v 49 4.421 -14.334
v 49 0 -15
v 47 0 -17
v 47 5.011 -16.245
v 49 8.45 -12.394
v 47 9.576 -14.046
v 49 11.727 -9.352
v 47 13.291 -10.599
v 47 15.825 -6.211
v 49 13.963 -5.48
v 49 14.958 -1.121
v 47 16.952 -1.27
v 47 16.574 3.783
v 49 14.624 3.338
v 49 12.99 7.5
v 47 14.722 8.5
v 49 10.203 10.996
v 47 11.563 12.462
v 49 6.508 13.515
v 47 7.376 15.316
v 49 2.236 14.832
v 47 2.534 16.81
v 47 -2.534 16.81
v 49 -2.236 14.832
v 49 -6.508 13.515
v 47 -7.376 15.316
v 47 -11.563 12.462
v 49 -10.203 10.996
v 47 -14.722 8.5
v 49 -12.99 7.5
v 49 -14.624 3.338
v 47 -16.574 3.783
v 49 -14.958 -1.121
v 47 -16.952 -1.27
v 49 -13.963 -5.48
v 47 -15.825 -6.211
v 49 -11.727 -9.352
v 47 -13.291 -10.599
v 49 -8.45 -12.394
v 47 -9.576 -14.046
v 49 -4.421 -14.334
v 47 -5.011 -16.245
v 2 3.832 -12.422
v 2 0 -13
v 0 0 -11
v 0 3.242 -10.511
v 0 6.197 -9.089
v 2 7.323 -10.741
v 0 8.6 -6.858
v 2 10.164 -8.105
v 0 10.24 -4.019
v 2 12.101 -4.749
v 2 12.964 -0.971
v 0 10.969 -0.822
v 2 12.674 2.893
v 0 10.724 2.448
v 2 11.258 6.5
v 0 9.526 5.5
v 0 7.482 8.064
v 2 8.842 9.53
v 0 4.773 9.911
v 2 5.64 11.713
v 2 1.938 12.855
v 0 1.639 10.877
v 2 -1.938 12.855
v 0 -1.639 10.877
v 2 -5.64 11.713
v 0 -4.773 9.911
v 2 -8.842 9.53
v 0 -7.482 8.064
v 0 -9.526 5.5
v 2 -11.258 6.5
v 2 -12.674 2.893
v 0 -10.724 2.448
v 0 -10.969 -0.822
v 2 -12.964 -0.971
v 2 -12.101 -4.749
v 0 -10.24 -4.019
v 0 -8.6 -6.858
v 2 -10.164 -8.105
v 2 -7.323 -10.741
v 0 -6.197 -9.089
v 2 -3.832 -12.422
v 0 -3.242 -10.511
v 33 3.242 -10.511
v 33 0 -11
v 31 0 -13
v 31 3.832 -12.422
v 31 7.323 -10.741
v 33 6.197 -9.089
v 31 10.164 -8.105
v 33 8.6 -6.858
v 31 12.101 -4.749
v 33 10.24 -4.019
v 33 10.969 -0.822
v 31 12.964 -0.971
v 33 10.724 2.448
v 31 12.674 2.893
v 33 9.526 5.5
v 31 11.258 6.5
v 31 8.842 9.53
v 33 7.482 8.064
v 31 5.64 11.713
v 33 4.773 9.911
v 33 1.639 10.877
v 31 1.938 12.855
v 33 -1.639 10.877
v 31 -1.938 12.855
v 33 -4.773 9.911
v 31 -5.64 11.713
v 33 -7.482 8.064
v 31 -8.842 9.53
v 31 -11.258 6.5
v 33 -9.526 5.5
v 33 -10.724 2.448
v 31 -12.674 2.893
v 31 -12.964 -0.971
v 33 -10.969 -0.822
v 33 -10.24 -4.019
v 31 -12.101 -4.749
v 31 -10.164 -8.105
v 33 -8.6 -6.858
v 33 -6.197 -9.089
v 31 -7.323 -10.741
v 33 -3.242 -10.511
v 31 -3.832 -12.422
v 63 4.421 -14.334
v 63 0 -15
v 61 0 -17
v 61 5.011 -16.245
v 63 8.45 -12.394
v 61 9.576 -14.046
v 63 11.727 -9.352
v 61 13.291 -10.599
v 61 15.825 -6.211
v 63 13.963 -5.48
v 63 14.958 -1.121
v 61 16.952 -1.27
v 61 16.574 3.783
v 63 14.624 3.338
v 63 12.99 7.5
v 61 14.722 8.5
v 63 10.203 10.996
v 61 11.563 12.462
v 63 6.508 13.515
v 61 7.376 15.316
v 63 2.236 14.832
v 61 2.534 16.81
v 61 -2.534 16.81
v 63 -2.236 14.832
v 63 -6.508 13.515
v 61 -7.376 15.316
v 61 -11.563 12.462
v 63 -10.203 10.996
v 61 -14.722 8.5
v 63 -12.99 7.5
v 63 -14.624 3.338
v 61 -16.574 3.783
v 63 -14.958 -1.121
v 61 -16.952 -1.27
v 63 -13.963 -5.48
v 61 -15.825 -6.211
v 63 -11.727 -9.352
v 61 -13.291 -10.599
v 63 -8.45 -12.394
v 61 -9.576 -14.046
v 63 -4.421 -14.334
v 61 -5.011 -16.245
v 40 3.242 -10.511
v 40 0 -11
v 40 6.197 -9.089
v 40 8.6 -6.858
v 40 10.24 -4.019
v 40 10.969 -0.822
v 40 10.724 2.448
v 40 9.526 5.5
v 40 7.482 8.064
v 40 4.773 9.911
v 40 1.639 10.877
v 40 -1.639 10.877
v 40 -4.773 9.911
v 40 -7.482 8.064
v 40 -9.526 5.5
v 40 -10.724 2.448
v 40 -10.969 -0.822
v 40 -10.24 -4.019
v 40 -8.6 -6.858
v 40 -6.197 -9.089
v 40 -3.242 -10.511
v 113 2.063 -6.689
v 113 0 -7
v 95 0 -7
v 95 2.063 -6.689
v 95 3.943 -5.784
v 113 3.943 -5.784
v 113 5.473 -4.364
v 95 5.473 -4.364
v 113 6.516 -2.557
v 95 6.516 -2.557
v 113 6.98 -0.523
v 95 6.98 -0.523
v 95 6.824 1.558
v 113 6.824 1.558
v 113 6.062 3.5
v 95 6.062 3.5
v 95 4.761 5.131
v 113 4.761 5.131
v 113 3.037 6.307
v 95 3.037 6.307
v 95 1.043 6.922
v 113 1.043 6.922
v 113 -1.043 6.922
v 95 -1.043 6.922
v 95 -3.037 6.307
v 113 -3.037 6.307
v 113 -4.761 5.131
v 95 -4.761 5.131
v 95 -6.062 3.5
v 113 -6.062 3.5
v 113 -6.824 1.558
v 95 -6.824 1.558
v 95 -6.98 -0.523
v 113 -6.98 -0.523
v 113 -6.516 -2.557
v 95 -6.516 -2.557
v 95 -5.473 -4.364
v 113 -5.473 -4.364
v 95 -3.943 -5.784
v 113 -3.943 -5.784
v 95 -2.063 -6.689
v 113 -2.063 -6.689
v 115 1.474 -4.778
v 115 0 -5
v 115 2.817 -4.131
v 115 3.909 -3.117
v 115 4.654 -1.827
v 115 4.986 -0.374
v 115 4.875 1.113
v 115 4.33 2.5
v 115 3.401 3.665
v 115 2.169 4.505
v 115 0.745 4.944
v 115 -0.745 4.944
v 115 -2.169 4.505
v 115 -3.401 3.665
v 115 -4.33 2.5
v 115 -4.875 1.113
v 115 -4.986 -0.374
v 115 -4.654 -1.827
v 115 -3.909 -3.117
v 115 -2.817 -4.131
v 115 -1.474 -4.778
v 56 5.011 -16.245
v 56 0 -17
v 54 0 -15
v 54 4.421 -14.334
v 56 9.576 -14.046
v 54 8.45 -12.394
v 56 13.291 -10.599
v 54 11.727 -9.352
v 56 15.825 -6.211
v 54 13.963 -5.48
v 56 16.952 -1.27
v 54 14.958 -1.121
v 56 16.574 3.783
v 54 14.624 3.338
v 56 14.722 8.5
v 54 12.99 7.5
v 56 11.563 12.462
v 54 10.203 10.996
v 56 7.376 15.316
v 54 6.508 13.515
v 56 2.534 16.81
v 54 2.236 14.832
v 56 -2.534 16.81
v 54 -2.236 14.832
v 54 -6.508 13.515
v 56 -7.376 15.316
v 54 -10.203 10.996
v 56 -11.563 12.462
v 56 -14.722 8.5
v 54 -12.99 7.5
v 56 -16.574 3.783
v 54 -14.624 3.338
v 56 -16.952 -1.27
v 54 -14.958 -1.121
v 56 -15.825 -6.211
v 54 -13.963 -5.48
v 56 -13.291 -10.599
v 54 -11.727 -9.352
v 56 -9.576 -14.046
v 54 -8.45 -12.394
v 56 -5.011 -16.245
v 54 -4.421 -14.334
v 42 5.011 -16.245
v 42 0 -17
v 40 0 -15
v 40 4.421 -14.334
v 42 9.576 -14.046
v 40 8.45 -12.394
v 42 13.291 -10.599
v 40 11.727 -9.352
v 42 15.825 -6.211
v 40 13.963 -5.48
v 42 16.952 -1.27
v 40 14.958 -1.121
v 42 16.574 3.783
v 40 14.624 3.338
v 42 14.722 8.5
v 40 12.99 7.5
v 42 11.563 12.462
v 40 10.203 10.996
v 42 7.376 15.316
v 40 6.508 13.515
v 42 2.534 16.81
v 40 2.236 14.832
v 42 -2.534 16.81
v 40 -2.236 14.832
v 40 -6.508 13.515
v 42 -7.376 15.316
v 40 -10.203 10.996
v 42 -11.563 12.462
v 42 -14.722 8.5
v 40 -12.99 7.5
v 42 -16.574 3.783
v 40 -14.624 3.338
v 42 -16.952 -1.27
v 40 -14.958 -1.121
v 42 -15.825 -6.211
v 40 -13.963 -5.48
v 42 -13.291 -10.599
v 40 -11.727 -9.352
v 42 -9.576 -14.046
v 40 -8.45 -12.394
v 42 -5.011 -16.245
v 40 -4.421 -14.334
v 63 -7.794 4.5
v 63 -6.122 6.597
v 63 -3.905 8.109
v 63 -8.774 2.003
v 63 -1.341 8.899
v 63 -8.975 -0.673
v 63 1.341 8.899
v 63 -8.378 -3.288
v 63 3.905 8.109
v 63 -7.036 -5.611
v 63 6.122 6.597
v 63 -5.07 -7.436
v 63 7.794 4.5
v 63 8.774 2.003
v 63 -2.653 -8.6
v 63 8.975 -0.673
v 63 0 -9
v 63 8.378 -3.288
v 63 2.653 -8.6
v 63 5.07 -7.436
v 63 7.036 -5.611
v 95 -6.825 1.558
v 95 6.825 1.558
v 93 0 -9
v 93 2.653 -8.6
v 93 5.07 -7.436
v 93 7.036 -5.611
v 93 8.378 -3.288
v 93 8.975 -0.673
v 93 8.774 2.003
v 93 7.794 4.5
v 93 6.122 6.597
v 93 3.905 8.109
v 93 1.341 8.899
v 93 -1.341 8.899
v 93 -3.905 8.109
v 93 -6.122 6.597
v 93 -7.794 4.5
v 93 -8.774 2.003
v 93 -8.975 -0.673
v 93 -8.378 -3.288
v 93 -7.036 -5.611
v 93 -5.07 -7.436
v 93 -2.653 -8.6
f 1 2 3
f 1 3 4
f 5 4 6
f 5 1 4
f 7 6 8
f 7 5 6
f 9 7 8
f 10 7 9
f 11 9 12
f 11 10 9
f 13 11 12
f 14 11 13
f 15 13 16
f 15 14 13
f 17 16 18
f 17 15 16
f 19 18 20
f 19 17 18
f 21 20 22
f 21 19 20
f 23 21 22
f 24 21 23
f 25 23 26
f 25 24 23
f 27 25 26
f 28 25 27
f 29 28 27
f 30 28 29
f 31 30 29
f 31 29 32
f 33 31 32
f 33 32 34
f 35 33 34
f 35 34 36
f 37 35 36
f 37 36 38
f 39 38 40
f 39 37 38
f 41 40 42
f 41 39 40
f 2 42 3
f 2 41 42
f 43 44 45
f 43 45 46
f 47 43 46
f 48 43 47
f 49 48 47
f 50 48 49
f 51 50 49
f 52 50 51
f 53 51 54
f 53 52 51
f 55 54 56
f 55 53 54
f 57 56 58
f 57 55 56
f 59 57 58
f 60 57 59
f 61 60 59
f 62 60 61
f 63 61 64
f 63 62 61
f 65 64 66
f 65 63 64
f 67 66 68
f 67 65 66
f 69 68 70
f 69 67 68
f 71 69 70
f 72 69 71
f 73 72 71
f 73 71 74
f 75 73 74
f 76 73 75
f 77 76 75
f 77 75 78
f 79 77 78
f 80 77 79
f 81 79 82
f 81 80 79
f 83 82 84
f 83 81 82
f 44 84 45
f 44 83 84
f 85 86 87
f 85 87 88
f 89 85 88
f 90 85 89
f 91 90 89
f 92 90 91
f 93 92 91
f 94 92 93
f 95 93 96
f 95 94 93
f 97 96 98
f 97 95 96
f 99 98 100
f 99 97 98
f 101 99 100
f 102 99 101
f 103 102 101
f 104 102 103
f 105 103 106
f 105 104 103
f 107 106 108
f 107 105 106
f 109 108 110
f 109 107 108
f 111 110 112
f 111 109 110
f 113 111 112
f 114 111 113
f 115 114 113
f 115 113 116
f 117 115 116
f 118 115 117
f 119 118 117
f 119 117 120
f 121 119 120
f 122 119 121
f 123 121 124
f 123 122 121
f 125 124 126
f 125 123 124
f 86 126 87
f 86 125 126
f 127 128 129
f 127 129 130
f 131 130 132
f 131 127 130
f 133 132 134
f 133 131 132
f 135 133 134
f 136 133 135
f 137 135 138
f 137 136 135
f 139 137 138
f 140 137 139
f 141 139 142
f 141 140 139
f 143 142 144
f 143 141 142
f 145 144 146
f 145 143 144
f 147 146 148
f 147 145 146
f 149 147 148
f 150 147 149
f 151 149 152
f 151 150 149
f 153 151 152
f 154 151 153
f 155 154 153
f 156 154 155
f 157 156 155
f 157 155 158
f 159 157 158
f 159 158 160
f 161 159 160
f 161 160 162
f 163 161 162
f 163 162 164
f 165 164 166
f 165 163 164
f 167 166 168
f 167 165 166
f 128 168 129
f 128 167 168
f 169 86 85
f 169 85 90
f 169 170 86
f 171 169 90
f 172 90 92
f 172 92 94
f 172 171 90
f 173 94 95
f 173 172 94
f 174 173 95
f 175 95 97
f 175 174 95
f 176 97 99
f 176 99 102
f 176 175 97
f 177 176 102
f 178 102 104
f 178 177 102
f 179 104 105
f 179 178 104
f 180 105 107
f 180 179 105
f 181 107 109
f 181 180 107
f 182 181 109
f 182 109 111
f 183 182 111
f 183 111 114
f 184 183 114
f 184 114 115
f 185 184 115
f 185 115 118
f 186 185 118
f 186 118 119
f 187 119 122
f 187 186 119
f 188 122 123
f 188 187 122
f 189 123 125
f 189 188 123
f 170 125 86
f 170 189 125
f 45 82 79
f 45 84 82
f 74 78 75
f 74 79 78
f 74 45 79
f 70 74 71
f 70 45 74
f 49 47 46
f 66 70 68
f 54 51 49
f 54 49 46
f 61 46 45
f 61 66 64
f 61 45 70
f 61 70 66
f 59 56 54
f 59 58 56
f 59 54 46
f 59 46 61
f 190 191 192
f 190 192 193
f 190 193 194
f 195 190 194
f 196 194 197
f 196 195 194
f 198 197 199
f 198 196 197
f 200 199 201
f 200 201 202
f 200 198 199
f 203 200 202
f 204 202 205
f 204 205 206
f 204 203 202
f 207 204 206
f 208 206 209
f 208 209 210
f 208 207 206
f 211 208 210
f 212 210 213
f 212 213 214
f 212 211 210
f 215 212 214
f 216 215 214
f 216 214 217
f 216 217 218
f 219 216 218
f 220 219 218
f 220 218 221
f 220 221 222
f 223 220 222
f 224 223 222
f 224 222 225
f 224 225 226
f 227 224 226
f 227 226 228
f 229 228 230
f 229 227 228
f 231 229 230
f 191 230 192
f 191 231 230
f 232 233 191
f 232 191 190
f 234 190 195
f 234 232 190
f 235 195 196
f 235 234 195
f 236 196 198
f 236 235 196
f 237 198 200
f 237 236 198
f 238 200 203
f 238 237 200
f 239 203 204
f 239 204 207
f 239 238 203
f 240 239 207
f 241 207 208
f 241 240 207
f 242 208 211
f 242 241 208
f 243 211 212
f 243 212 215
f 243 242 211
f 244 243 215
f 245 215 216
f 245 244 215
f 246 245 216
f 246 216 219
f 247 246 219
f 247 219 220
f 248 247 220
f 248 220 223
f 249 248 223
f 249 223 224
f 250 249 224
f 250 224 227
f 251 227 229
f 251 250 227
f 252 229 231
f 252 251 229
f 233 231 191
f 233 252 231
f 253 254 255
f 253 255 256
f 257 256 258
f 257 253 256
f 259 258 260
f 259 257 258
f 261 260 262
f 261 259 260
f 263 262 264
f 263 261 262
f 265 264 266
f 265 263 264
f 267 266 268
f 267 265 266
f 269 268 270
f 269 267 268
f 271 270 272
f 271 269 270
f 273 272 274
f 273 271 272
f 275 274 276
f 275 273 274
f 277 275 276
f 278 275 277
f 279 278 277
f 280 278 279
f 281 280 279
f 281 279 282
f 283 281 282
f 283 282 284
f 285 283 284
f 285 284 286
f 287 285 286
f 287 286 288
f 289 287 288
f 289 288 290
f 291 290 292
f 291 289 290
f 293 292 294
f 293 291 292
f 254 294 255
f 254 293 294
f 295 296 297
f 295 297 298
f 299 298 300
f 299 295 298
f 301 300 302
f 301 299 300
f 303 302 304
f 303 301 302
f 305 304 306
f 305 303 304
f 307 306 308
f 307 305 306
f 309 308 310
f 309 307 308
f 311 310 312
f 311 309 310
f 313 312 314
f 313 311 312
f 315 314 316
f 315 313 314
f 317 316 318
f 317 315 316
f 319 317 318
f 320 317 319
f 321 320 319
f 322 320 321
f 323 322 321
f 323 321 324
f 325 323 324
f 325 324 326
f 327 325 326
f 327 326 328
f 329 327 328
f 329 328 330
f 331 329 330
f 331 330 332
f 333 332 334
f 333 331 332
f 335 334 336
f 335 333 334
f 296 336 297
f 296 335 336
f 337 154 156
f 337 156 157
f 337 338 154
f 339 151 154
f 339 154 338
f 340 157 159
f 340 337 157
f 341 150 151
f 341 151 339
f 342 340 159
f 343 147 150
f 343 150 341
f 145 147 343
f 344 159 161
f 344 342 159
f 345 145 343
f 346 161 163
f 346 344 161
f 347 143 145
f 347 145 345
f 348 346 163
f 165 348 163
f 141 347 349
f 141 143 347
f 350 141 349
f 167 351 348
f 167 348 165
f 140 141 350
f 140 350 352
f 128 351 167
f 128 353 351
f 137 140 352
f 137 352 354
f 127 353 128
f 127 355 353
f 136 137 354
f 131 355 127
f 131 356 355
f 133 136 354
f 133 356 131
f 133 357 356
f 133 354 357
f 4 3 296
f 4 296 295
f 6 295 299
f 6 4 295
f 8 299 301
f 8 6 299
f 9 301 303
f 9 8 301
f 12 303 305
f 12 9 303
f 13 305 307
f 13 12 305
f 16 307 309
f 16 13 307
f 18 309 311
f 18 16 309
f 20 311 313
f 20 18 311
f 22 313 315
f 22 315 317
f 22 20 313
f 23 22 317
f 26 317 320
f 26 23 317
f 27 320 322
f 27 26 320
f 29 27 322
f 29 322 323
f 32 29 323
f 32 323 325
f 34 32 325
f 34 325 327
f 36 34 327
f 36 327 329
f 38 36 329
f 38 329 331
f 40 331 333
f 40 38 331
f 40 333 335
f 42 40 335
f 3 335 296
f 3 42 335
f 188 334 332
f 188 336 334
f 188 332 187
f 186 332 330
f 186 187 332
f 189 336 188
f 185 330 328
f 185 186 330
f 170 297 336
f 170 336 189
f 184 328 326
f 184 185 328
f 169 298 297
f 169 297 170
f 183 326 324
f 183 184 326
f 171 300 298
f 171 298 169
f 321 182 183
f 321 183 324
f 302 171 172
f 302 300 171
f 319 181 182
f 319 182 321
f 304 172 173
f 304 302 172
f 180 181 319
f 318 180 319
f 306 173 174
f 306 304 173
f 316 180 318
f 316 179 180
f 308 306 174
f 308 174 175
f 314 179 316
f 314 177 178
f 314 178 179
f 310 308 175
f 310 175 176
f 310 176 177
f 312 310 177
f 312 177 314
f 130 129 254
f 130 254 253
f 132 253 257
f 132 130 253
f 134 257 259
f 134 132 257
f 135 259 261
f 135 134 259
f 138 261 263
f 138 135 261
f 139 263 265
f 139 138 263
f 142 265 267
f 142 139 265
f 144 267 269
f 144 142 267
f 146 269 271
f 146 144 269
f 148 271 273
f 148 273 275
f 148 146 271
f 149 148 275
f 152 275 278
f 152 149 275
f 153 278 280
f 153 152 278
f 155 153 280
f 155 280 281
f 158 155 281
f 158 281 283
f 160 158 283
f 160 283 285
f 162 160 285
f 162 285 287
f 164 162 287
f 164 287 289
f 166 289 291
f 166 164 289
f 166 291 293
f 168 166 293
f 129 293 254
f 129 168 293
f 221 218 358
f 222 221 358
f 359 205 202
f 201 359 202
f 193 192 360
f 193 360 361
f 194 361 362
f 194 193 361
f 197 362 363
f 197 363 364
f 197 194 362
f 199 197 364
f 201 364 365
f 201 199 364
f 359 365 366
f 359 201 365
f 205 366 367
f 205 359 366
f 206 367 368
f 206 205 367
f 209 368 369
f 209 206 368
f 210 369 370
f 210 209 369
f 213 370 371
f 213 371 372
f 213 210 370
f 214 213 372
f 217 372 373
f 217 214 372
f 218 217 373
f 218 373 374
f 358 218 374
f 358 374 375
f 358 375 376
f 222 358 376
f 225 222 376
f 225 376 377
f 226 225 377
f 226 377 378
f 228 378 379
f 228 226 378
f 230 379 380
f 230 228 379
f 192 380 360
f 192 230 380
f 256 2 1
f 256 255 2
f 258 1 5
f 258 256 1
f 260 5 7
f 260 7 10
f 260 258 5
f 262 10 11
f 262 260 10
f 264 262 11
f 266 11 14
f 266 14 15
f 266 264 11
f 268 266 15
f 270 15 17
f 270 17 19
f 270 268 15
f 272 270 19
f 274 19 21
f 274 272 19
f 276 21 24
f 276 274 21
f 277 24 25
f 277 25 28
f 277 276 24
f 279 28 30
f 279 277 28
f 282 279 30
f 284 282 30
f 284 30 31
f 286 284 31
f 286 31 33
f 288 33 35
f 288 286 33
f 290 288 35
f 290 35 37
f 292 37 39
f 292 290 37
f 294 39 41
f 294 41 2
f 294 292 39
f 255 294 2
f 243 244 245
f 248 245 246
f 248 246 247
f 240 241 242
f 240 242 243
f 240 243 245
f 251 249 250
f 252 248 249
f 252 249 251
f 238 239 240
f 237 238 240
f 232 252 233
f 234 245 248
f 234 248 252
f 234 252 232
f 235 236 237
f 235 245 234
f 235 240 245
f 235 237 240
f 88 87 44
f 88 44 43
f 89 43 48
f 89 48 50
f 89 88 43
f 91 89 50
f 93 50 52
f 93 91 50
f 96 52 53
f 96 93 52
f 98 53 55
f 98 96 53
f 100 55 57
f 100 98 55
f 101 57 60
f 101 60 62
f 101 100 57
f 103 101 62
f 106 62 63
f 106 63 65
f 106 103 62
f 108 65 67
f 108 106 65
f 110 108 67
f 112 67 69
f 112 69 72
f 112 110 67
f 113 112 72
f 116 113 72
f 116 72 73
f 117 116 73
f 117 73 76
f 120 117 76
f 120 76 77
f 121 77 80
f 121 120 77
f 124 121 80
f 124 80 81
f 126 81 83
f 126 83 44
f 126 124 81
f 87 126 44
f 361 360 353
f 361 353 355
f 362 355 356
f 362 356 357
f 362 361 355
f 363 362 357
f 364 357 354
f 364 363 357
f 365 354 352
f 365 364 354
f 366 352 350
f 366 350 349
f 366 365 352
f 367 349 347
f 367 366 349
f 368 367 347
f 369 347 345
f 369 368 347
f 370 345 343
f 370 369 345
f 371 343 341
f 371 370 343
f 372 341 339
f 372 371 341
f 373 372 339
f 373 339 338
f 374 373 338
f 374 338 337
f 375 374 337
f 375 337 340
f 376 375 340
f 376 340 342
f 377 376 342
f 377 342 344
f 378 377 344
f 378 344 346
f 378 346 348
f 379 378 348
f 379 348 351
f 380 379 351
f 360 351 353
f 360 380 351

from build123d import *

# Parameters (mm, degrees)
F0_W    = 7
F0_H    = 11
F0_W_2  = 5
F0_H_2  = 15
F0_W_3  = 20
F0_H_3  = 7
F2_SIZE = 1.99999


# Not quite as in the source:
# - a fillet or chamfer is up to 0.001 mm smaller than in the source, because OpenCascade refuses the exact size


with BuildPart() as f1:
    # F0 (on Front) → F1 (revolve)
    with BuildSketch(Plane.XZ):
        Polygon((33, 0), (0, 0), (0, -13), (33, -13), (33, -11), align=None)
        with Locations((36.5, -5.5)):
            Rectangle(F0_W, F0_H)
        Polygon((49, 0), (40, 0), (40, -11), (40, -17), (49, -17), (49, -15), align=None)
        with Locations((51.5, -7.5)):
            Rectangle(F0_W_2, F0_H_2)
        Polygon((63, 0), (54, 0), (54, -15), (54, -17), (63, -17), (63, -9), align=None)
        Polygon((95, 0), (63, 0), (63, -9), (95, -9), (95, -7), align=None)
        with Locations((105, -3.5)):
            Rectangle(F0_W_3, F0_H_3)
    revolve(axis=Axis((51.5, 0, 0), (1, 0, 0)))

    # F2 (size 2 in the source; OpenCascade refuses exactly that, so slightly less here)
    f2_edges = [f1.edges().sort_by_distance(p)[0] for p in [
        (0, 0, 13),
        (33, 0, 13),
        (16.5, 0, -13),
        (40, 0, 17),
        (49, 0, 17),
        (54, 0, 17),
        (63, 0, 17),
        (95, 0, 9),
        (115, 0, 7),
    ]]
    chamfer(f2_edges, length=F2_SIZE)


solid = f1.part
